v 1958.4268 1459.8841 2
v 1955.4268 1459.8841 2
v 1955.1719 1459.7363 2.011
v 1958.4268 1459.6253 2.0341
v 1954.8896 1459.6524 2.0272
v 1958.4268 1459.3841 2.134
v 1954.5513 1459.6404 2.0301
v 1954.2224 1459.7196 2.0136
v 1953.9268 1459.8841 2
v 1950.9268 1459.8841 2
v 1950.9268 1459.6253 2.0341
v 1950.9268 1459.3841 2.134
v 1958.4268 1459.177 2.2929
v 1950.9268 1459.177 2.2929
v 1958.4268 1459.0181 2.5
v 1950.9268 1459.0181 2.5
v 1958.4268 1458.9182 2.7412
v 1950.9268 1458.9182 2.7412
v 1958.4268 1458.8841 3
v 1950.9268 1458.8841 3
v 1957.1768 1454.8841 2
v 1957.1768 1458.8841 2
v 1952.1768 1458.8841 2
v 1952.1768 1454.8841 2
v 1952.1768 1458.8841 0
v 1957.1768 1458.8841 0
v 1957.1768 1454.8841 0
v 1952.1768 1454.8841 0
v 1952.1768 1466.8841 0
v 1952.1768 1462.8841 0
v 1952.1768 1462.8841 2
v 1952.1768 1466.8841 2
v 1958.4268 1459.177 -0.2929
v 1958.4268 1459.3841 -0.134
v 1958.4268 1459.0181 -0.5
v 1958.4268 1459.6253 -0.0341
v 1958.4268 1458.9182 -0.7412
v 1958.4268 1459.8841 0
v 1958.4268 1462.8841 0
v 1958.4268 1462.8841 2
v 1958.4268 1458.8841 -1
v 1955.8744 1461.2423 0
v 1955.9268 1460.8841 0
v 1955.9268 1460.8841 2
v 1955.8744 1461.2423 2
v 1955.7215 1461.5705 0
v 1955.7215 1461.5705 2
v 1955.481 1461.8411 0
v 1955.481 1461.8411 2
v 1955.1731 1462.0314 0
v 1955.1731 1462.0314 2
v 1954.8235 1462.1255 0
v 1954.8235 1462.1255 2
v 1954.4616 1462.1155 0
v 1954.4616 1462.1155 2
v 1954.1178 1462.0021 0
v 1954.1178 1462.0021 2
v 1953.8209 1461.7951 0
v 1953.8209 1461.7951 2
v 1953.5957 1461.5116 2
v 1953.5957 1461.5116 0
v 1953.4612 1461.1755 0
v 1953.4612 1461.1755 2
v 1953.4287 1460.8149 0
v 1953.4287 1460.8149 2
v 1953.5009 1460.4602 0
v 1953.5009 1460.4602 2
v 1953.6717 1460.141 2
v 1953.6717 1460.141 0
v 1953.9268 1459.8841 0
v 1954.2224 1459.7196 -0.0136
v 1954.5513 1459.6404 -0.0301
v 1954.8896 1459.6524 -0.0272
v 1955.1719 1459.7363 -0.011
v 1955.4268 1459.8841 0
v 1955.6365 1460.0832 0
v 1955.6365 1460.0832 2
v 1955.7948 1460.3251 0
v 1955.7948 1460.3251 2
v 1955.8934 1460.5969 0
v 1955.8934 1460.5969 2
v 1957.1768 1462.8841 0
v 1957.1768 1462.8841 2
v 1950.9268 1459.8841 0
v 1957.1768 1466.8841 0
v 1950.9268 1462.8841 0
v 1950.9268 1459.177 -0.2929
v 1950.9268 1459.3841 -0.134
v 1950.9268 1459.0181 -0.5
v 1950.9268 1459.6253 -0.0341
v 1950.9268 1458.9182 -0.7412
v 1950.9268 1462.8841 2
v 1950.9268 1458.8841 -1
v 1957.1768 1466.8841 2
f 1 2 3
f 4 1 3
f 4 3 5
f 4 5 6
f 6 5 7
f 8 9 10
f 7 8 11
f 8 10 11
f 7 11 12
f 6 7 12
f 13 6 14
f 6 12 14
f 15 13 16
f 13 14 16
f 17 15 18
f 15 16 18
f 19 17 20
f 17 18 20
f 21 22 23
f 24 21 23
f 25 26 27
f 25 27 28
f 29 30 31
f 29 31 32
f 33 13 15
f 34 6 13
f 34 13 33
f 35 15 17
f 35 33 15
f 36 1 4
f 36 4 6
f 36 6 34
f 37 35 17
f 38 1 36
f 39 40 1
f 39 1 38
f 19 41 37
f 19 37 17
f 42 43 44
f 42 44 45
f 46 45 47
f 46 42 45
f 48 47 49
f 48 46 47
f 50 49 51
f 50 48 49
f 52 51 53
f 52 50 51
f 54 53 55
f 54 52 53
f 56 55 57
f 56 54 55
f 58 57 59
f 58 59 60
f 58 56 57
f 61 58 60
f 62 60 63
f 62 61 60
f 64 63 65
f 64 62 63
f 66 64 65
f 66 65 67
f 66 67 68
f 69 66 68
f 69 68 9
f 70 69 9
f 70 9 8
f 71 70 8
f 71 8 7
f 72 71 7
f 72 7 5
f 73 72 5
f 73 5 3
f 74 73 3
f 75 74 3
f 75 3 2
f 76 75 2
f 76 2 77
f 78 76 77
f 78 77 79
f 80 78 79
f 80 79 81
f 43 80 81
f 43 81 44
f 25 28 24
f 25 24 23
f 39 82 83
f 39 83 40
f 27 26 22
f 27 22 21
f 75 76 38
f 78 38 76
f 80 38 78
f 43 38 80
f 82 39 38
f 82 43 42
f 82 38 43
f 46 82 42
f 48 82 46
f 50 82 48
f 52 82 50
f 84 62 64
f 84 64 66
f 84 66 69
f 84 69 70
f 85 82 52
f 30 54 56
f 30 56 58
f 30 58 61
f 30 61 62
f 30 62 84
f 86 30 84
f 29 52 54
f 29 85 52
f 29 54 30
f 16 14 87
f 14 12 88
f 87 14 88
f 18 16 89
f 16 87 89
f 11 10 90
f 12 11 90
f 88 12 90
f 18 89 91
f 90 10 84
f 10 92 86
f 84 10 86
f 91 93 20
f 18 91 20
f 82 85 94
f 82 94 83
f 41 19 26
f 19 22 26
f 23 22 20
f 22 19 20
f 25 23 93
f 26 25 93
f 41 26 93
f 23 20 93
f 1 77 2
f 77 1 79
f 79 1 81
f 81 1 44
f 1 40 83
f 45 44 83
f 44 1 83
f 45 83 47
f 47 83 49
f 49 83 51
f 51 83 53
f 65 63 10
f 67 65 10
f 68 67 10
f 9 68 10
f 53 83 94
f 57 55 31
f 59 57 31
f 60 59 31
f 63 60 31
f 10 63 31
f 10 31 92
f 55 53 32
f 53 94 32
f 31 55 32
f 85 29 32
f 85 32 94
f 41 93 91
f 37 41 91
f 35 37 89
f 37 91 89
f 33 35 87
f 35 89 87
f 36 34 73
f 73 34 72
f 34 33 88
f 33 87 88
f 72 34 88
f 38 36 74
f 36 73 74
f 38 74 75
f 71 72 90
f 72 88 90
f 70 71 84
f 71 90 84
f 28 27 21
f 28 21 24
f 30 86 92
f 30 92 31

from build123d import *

# Parameters (mm, degrees)
SKETCH1_R               = 1.25
BOSS_EXTRUDE1_DEPTH     = 2
BOSS_EXTRUDE2_DEPTH     = 7.5
SKETCH3_R               = 1.25
CUT_EXTRUDE1_DEPTH      = 2
CUT_EXTRUDE1_DEPTH_BACK = 4


with BuildPart() as part:
    # Sketch1 → Boss-Extrude1 (new body)
    with BuildSketch(Plane.XY):
        Polygon((1952.176808721, 1466.884115951), (1957.176808721, 1466.884115951), (1957.176808721, 1462.884115951), (1958.426808721, 1462.884115951), (1958.426808721, 1458.884115951), (1957.176808721, 1458.884115951), (1957.176808721, 1454.884115951), (1952.176808721, 1454.884115951), (1952.176808721, 1458.884115951), (1950.926808721, 1458.884115951), (1950.926808721, 1462.884115951), (1952.176808721, 1462.884115951), align=None)
        with Locations((1954.676808721, 1460.884115951)):
            Circle(SKETCH1_R, mode=Mode.SUBTRACT)
    extrude(amount=BOSS_EXTRUDE1_DEPTH)

    # Sketch2 → Boss-Extrude2 (add)
    with BuildSketch(Plane.ZY.offset(-1950.926808721)):
        with BuildLine():
            Line((2, 1458.884115951), (2, 1459.884115951))
            ThreePointArc((2, 1459.884115951), (2.292893219, 1459.17700917), (3, 1458.884115951))
            Line((3, 1458.884115951), (2, 1458.884115951))
        make_face()
        with BuildLine():
            Line((0, 1458.884115951), (-1, 1458.884115951))
            ThreePointArc((-1, 1458.884115951), (-0.292893219, 1459.17700917), (0, 1459.884115951))
            Line((0, 1459.884115951), (0, 1458.884115951))
        make_face()
    extrude(amount=-BOSS_EXTRUDE2_DEPTH)

    # Sketch3 → Cut-Extrude1 (cut, two sides)
    with BuildSketch(Plane.XY.offset(2)) as cut_extrude1_sk:
        with Locations((1954.676808721, 1460.884115951)):
            Circle(SKETCH3_R)
    extrude(amount=CUT_EXTRUDE1_DEPTH, mode=Mode.SUBTRACT)
    extrude(cut_extrude1_sk.sketch, amount=-CUT_EXTRUDE1_DEPTH_BACK, mode=Mode.SUBTRACT)


solid = part.part
